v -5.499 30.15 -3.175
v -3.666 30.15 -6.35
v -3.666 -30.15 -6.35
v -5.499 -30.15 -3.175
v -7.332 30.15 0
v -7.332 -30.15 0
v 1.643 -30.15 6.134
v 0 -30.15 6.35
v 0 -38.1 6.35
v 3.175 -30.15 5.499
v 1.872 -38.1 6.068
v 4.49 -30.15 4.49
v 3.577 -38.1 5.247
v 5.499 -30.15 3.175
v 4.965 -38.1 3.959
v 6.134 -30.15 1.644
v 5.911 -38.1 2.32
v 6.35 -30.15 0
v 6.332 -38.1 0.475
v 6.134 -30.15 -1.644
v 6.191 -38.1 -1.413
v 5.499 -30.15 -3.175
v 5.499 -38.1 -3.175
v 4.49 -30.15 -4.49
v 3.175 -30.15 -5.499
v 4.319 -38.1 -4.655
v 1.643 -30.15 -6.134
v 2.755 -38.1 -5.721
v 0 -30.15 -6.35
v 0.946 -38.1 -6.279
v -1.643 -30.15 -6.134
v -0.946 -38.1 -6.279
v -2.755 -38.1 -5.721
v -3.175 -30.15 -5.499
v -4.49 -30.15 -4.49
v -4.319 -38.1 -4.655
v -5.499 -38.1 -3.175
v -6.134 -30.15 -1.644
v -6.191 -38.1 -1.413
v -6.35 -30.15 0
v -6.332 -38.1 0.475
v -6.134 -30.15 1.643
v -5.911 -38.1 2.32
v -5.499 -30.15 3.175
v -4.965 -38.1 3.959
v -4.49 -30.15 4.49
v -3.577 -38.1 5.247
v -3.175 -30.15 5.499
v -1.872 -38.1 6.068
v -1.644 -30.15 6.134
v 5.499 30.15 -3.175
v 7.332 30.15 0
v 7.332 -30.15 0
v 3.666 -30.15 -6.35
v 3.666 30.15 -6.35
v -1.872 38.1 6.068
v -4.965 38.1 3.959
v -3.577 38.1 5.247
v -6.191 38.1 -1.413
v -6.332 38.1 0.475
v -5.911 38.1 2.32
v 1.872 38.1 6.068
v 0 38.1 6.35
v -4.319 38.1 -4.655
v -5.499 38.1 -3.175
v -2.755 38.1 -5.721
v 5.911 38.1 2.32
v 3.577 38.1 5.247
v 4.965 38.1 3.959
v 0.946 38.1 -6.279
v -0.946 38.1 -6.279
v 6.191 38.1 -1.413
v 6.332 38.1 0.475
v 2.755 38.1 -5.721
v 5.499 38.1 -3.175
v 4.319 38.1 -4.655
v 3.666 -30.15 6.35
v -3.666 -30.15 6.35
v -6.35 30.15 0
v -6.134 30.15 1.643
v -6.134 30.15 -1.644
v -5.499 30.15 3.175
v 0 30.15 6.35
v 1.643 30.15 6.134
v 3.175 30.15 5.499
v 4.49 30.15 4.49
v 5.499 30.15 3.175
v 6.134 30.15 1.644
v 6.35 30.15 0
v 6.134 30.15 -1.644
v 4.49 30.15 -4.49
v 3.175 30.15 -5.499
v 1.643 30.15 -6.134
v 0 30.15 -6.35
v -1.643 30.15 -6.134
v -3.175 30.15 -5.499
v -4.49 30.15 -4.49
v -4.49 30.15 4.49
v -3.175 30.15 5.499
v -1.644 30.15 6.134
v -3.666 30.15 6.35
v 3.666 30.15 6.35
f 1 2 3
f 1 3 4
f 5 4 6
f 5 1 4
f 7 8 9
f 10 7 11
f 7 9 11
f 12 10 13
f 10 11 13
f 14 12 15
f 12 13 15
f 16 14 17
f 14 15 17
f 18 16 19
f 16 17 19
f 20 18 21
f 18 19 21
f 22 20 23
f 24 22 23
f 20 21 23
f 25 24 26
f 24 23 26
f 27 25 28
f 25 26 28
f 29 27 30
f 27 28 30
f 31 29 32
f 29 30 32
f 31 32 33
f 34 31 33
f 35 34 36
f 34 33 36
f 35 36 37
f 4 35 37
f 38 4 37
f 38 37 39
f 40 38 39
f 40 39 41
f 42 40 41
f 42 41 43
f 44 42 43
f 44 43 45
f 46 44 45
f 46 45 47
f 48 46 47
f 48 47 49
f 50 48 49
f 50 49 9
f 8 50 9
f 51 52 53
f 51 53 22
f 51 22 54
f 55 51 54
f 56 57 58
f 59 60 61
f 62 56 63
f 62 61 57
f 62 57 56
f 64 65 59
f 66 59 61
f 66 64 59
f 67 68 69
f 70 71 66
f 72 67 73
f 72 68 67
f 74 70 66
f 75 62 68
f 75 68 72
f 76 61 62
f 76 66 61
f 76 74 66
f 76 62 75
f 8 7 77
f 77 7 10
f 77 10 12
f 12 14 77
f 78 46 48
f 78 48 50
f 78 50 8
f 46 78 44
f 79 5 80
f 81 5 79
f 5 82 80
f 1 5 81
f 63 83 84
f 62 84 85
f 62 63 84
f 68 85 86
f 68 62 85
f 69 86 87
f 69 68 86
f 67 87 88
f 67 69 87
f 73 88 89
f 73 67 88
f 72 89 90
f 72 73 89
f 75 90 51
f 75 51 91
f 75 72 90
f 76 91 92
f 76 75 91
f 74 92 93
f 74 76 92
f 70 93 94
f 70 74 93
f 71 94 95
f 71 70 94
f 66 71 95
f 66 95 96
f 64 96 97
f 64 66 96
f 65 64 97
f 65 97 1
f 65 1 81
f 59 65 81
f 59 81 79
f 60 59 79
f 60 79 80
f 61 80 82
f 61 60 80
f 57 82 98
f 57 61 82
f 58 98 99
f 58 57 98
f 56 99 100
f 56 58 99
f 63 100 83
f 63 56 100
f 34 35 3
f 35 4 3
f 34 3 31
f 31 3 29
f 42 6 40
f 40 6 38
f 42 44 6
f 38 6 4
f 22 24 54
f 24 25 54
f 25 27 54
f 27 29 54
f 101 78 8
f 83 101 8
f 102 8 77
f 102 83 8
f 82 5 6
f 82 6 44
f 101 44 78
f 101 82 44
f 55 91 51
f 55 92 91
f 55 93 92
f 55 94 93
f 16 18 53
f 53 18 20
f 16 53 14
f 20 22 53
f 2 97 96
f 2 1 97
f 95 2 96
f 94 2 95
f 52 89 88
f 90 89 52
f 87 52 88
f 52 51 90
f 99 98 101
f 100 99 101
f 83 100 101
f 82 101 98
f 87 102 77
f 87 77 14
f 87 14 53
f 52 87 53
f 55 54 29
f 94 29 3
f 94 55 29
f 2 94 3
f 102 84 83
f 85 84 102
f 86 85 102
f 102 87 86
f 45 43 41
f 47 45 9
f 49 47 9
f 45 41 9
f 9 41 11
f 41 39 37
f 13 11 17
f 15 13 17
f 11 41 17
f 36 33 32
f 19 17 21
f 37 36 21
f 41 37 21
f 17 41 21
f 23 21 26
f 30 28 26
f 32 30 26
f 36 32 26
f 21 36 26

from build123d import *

# Parameters (mm, degrees)
BOSS_EXTRUDE1_DEPTH = 38.1
SKETCH2_OUTSIDE_W   = 32.39
SKETCH2_OUTSIDE_H   = 30.426
SKETCH2_OUTSIDE_R   = 6.35
CUT_EXTRUDE1_DEPTH  = 7.9502


with BuildPart() as part:
    # Sketch1 → Boss-Extrude1 (new, symmetric)
    with BuildSketch(Plane(origin=(0, 0, 0), x_dir=(1, 0, 0), z_dir=(0, 1, 0))):
        Polygon((3.666174209, -6.35), (7.332348419, 0), (3.666174209, 6.35), (-3.666174209, 6.35), (-7.332348419, 0), (-3.666174209, -6.35), align=None)
    extrude(amount=BOSS_EXTRUDE1_DEPTH, both=True)

    # Sketch2 outside → Cut-Extrude1 (cut)
    with BuildSketch(Plane(origin=(0, 38.1, 0), x_dir=(1, 0, 0), z_dir=(0, 1, 0))):
        Rectangle(SKETCH2_OUTSIDE_W, SKETCH2_OUTSIDE_H)
        with Locations(Location((0, 0, 0), (0, 0, 270))):
            Circle(SKETCH2_OUTSIDE_R, mode=Mode.SUBTRACT)
    cut_extrude1 = extrude(amount=-CUT_EXTRUDE1_DEPTH, mode=Mode.SUBTRACT)

    # Mirror1: Cut-Extrude1 across plane
    add(cut_extrude1.mirror(Plane.ZX), mode=Mode.SUBTRACT)


solid = part.part
